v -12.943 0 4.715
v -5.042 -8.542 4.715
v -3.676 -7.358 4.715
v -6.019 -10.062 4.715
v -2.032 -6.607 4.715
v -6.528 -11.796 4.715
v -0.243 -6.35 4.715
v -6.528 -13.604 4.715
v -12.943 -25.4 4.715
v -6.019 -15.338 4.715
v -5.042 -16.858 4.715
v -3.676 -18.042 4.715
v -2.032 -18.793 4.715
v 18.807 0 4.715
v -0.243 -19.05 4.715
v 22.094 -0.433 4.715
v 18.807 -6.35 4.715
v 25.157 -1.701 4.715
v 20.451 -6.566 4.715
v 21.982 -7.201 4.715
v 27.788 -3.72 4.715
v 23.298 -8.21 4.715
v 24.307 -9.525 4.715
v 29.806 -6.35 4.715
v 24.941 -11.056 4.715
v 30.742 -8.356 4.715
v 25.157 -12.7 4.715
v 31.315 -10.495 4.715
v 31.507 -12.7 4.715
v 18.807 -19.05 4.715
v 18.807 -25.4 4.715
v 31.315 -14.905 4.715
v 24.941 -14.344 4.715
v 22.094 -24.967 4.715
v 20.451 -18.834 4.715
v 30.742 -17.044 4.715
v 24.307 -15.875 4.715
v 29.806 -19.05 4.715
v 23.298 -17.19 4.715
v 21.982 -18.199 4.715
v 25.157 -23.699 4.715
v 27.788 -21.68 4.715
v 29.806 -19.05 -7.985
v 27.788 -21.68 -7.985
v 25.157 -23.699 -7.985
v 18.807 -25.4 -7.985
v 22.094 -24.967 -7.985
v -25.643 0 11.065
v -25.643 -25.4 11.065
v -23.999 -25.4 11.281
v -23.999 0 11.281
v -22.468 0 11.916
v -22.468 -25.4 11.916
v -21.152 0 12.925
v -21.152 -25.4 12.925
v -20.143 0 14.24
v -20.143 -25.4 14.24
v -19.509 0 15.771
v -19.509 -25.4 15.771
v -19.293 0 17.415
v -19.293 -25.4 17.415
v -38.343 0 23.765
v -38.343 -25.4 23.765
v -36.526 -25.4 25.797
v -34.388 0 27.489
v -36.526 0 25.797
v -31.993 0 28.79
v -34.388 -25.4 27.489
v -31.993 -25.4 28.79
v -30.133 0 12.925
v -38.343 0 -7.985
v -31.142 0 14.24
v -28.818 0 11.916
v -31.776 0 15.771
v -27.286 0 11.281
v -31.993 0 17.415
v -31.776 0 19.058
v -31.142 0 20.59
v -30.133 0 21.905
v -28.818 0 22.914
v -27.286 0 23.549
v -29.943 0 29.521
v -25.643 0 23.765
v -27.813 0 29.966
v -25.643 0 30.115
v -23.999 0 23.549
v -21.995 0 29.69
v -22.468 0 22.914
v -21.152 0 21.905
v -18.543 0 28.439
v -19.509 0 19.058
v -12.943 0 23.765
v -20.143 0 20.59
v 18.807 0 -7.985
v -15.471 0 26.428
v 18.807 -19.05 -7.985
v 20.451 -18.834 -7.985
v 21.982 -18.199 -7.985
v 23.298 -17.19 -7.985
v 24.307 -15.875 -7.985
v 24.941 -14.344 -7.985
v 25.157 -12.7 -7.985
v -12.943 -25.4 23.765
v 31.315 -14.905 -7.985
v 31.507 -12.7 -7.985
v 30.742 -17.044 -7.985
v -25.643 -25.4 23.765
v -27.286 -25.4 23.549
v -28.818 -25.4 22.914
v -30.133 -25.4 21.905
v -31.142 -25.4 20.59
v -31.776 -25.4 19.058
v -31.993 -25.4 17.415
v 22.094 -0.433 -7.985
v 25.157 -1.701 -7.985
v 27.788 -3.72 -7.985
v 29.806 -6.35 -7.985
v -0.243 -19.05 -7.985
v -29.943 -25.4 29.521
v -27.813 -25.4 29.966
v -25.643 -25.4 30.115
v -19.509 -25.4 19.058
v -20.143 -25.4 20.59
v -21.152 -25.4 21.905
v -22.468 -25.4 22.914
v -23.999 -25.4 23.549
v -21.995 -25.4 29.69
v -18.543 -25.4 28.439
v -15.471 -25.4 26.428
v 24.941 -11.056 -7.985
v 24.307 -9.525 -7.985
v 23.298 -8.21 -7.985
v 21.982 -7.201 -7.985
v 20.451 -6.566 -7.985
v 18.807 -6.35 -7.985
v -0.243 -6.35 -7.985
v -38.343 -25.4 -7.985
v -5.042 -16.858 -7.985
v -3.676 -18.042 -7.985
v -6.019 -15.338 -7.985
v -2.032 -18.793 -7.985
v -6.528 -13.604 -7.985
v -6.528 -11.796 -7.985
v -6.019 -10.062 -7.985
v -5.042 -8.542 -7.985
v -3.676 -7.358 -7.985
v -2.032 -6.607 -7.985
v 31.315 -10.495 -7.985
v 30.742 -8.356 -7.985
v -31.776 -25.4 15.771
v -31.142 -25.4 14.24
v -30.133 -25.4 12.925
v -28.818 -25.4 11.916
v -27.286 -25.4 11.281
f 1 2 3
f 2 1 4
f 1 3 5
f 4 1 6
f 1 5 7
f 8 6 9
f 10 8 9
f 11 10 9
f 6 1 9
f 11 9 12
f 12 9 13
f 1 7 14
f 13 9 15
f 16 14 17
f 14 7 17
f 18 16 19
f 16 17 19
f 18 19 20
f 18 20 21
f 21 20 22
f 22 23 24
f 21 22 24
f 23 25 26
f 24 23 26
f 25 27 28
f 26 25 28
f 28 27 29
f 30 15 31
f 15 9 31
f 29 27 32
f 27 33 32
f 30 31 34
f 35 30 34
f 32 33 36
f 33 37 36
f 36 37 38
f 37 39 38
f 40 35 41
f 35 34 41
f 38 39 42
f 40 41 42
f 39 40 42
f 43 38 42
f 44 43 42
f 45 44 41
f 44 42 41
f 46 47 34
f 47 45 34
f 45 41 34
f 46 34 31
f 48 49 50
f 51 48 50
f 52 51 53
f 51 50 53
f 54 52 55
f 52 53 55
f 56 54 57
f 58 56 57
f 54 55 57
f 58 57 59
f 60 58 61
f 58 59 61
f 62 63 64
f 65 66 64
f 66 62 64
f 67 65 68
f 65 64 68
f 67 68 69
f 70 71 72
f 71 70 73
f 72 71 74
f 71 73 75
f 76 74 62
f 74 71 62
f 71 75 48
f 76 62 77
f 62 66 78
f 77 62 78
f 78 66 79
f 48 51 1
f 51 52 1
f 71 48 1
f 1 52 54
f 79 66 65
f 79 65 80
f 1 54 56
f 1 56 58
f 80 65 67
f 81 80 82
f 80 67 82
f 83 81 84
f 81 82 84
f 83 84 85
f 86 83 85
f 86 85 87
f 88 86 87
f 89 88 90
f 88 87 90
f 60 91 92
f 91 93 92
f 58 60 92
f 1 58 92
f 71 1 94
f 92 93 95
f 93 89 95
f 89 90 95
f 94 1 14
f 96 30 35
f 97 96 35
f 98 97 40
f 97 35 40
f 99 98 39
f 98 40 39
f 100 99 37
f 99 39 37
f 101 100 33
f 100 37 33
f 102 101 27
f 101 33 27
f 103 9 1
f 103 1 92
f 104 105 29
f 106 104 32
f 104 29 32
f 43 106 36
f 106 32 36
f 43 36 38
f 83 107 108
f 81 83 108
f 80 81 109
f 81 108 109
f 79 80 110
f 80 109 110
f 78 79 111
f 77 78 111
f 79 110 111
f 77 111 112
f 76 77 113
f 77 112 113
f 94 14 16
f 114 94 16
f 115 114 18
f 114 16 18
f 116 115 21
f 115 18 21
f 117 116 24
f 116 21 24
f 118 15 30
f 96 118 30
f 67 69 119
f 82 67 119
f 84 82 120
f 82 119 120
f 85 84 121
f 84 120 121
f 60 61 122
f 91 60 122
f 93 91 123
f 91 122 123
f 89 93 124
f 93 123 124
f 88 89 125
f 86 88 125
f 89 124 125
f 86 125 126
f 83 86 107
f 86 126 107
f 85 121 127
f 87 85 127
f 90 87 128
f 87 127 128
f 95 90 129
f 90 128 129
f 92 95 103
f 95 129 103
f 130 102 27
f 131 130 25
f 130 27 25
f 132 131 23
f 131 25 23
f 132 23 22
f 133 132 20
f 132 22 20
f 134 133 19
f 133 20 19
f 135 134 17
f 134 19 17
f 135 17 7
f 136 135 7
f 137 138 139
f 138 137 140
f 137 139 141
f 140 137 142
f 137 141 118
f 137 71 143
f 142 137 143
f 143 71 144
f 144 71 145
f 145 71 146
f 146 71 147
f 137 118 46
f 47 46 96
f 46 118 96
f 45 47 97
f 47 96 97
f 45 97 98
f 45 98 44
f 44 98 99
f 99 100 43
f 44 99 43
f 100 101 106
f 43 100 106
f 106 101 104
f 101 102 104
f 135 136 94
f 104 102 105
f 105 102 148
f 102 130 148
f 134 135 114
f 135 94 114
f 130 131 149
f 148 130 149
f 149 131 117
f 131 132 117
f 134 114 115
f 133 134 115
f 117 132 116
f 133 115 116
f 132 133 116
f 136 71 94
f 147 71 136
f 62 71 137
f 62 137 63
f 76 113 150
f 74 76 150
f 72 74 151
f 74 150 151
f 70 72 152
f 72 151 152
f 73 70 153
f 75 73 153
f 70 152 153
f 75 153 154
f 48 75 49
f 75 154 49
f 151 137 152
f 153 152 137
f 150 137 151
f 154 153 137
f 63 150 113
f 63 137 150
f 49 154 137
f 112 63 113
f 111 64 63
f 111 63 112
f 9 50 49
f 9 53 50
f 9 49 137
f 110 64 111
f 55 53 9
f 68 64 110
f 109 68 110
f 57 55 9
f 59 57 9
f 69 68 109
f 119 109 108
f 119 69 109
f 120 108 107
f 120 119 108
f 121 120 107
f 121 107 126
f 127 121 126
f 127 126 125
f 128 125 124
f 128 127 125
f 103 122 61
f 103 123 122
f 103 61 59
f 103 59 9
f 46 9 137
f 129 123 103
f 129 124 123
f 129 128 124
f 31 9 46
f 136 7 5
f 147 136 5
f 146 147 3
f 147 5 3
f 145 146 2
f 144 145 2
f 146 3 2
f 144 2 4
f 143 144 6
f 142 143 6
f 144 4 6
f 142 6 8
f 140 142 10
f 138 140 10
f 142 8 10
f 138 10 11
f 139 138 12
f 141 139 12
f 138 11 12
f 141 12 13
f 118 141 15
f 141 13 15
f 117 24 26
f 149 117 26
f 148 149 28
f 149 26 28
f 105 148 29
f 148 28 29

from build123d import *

# Parameters (mm, degrees)
F0_W     = 69.85
F0_H     = 38.1
F1_DEPTH = 25.4
F2_W     = 44.45
F2_H     = 25.4
F3_DEPTH = 25.401
F5_DEPTH = 25.401
F7_DEPTH = 12.701


with BuildPart() as f1:
    # F0 (on Front) → F1 (new body)
    with BuildSketch(Plane.XZ):
        with Locations((-3.4175124019, 11.064895078)):
            Rectangle(F0_W, F0_H)
    extrude(amount=F1_DEPTH)

    # F2 (on face) → F3 (cut, through all)
    with BuildSketch(Plane.XZ.offset(25.4)):
        with Locations((9.2824875981, 17.414895078)):
            Rectangle(F2_W, F2_H)
    extrude(amount=-F3_DEPTH, mode=Mode.SUBTRACT)

    # F4 (on face) → F5 (cut, through all)
    with BuildSketch(Plane.XZ.offset(25.4)):
        with BuildLine():
            Line((-19.2925124019, 30.114895078), (-19.2925124019, 28.7895729095))
            ThreePointArc((-19.2925124019, 28.7895729095), (-15.79175244, 26.6889172554), (-12.9425124019, 23.764895078))
            Line((-12.9425124019, 23.764895078), (-12.9425124019, 30.114895078))
            Line((-12.9425124019, 30.114895078), (-19.2925124019, 30.114895078))
        make_face()
        with BuildLine():
            Line((-38.3425124019, 30.114895078), (-38.3425124019, 23.764895078))
            ThreePointArc((-38.3425124019, 23.764895078), (-35.4932723639, 26.6889172554), (-31.9925124019, 28.7895729095))
            Line((-31.9925124019, 28.7895729095), (-31.9925124019, 30.114895078))
            Line((-31.9925124019, 30.114895078), (-38.3425124019, 30.114895078))
        make_face()
        with BuildLine():
            ThreePointArc((-19.2925124019, 17.414895078), (-21.1523843414, 21.9050231385), (-25.6425124019, 23.764895078))
            ThreePointArc((-25.6425124019, 23.764895078), (-30.1326404625, 21.9050231385), (-31.9925124019, 17.414895078))
            ThreePointArc((-31.9925124019, 17.414895078), (-30.132640455, 12.92476701), (-25.6425123807, 11.064895078))
            ThreePointArc((-25.6425123807, 11.064895078), (-21.1523843339, 12.924767025), (-19.2925124019, 17.414895078))
        make_face()
        with BuildLine():
            Line((-19.2925124019, 30.114895078), (-25.6425124019, 30.114895078))
            ThreePointArc((-25.6425124019, 30.114895078), (-22.3990968084, 29.7800327958), (-19.2925124019, 28.7895729095))
            Line((-19.2925124019, 28.7895729095), (-19.2925124019, 30.114895078))
        make_face()
        with BuildLine():
            Line((-31.9925124019, 30.114895078), (-31.9925124019, 28.7895729095))
            ThreePointArc((-31.9925124019, 28.7895729095), (-28.8859279955, 29.7800327958), (-25.6425124019, 30.114895078))
            Line((-25.6425124019, 30.114895078), (-31.9925124019, 30.114895078))
        make_face()
    extrude(amount=-F5_DEPTH, mode=Mode.SUBTRACT)

    # F6 (on face) → F7 (cut, through all)
    with BuildSketch(Plane.XY.offset(4.714895078)):
        with BuildLine():
            ThreePointArc((6.1074875981, -12.7), (4.2476156561, -8.209871937), (-0.242512409, -6.35))
            Line((-0.2425124019, -6.35), (-0.2425124019, -19.05))
            ThreePointArc((-0.2425123804, -19.05), (4.2476156662, -17.1901280529), (6.1074875981, -12.7))
        make_face()
        with BuildLine():
            Line((18.8074875981, -19.05), (18.8074875981, -6.35))
            ThreePointArc((18.8074875981, -6.35), (12.4574875981, -12.7), (18.8074875981, -19.05))
        make_face()
        with BuildLine():
            ThreePointArc((25.1574875981, -12.7), (23.2976156586, -8.2098719395), (18.8074875981, -6.35))
            Line((18.8074875981, -6.35), (18.8074875981, -19.05))
            ThreePointArc((18.8074875981, -19.05), (23.2976156586, -17.1901280605), (25.1574875981, -12.7))
        make_face()
        with BuildLine():
            Line((18.8074875981, -6.35), (-0.242512409, -6.35))
            ThreePointArc((-0.242512409, -6.35), (4.2476156561, -8.209871937), (6.1074875981, -12.7))
            ThreePointArc((6.1074875981, -12.7), (4.2476156662, -17.1901280529), (-0.2425123804, -19.05))
            Line((-0.2425123804, -19.05), (18.8074875981, -19.05))
            ThreePointArc((18.8074875981, -19.05), (12.4574875981, -12.7), (18.8074875981, -6.35))
        make_face()
        with BuildLine():
            Line((31.5074875981, 0), (18.8074875981, 0))
            ThreePointArc((18.8074875981, 0), (25.1574875981, -1.7014773719), (29.8060102261, -6.35))
            Line((29.8060102261, -6.35), (31.5074875981, -6.35))
            Line((31.5074875981, -6.35), (31.5074875981, 0))
        make_face()
        with BuildLine():
            ThreePointArc((29.8060102261, -19.05), (25.1574875981, -23.6985226281), (18.8074875981, -25.4))
            Line((18.8074875981, -25.4), (31.5074875981, -25.4))
            Line((31.5074875981, -25.4), (31.5074875981, -19.05))
            Line((31.5074875981, -19.05), (29.8060102261, -19.05))
        make_face()
        with BuildLine():
            Line((31.5074875981, -19.05), (31.5074875981, -12.7))
            ThreePointArc((31.5074875981, -12.7), (31.0747455919, -15.9870018728), (29.8060102261, -19.05))
            Line((29.8060102261, -19.05), (31.5074875981, -19.05))
        make_face()
        with BuildLine():
            Line((31.5074875981, -6.35), (29.8060102261, -6.35))
            ThreePointArc((29.8060102261, -6.35), (31.0747455919, -9.4129981272), (31.5074875981, -12.7))
            Line((31.5074875981, -12.7), (31.5074875981, -6.35))
        make_face()
        with BuildLine():
            Line((-0.2425124019, -19.05), (-0.2425124019, -6.35))
            ThreePointArc((-0.242512409, -6.35), (-6.5925124019, -12.7000000143), (-0.2425123804, -19.05))
        make_face()
    extrude(amount=-F7_DEPTH, mode=Mode.SUBTRACT)


solid = f1.part
